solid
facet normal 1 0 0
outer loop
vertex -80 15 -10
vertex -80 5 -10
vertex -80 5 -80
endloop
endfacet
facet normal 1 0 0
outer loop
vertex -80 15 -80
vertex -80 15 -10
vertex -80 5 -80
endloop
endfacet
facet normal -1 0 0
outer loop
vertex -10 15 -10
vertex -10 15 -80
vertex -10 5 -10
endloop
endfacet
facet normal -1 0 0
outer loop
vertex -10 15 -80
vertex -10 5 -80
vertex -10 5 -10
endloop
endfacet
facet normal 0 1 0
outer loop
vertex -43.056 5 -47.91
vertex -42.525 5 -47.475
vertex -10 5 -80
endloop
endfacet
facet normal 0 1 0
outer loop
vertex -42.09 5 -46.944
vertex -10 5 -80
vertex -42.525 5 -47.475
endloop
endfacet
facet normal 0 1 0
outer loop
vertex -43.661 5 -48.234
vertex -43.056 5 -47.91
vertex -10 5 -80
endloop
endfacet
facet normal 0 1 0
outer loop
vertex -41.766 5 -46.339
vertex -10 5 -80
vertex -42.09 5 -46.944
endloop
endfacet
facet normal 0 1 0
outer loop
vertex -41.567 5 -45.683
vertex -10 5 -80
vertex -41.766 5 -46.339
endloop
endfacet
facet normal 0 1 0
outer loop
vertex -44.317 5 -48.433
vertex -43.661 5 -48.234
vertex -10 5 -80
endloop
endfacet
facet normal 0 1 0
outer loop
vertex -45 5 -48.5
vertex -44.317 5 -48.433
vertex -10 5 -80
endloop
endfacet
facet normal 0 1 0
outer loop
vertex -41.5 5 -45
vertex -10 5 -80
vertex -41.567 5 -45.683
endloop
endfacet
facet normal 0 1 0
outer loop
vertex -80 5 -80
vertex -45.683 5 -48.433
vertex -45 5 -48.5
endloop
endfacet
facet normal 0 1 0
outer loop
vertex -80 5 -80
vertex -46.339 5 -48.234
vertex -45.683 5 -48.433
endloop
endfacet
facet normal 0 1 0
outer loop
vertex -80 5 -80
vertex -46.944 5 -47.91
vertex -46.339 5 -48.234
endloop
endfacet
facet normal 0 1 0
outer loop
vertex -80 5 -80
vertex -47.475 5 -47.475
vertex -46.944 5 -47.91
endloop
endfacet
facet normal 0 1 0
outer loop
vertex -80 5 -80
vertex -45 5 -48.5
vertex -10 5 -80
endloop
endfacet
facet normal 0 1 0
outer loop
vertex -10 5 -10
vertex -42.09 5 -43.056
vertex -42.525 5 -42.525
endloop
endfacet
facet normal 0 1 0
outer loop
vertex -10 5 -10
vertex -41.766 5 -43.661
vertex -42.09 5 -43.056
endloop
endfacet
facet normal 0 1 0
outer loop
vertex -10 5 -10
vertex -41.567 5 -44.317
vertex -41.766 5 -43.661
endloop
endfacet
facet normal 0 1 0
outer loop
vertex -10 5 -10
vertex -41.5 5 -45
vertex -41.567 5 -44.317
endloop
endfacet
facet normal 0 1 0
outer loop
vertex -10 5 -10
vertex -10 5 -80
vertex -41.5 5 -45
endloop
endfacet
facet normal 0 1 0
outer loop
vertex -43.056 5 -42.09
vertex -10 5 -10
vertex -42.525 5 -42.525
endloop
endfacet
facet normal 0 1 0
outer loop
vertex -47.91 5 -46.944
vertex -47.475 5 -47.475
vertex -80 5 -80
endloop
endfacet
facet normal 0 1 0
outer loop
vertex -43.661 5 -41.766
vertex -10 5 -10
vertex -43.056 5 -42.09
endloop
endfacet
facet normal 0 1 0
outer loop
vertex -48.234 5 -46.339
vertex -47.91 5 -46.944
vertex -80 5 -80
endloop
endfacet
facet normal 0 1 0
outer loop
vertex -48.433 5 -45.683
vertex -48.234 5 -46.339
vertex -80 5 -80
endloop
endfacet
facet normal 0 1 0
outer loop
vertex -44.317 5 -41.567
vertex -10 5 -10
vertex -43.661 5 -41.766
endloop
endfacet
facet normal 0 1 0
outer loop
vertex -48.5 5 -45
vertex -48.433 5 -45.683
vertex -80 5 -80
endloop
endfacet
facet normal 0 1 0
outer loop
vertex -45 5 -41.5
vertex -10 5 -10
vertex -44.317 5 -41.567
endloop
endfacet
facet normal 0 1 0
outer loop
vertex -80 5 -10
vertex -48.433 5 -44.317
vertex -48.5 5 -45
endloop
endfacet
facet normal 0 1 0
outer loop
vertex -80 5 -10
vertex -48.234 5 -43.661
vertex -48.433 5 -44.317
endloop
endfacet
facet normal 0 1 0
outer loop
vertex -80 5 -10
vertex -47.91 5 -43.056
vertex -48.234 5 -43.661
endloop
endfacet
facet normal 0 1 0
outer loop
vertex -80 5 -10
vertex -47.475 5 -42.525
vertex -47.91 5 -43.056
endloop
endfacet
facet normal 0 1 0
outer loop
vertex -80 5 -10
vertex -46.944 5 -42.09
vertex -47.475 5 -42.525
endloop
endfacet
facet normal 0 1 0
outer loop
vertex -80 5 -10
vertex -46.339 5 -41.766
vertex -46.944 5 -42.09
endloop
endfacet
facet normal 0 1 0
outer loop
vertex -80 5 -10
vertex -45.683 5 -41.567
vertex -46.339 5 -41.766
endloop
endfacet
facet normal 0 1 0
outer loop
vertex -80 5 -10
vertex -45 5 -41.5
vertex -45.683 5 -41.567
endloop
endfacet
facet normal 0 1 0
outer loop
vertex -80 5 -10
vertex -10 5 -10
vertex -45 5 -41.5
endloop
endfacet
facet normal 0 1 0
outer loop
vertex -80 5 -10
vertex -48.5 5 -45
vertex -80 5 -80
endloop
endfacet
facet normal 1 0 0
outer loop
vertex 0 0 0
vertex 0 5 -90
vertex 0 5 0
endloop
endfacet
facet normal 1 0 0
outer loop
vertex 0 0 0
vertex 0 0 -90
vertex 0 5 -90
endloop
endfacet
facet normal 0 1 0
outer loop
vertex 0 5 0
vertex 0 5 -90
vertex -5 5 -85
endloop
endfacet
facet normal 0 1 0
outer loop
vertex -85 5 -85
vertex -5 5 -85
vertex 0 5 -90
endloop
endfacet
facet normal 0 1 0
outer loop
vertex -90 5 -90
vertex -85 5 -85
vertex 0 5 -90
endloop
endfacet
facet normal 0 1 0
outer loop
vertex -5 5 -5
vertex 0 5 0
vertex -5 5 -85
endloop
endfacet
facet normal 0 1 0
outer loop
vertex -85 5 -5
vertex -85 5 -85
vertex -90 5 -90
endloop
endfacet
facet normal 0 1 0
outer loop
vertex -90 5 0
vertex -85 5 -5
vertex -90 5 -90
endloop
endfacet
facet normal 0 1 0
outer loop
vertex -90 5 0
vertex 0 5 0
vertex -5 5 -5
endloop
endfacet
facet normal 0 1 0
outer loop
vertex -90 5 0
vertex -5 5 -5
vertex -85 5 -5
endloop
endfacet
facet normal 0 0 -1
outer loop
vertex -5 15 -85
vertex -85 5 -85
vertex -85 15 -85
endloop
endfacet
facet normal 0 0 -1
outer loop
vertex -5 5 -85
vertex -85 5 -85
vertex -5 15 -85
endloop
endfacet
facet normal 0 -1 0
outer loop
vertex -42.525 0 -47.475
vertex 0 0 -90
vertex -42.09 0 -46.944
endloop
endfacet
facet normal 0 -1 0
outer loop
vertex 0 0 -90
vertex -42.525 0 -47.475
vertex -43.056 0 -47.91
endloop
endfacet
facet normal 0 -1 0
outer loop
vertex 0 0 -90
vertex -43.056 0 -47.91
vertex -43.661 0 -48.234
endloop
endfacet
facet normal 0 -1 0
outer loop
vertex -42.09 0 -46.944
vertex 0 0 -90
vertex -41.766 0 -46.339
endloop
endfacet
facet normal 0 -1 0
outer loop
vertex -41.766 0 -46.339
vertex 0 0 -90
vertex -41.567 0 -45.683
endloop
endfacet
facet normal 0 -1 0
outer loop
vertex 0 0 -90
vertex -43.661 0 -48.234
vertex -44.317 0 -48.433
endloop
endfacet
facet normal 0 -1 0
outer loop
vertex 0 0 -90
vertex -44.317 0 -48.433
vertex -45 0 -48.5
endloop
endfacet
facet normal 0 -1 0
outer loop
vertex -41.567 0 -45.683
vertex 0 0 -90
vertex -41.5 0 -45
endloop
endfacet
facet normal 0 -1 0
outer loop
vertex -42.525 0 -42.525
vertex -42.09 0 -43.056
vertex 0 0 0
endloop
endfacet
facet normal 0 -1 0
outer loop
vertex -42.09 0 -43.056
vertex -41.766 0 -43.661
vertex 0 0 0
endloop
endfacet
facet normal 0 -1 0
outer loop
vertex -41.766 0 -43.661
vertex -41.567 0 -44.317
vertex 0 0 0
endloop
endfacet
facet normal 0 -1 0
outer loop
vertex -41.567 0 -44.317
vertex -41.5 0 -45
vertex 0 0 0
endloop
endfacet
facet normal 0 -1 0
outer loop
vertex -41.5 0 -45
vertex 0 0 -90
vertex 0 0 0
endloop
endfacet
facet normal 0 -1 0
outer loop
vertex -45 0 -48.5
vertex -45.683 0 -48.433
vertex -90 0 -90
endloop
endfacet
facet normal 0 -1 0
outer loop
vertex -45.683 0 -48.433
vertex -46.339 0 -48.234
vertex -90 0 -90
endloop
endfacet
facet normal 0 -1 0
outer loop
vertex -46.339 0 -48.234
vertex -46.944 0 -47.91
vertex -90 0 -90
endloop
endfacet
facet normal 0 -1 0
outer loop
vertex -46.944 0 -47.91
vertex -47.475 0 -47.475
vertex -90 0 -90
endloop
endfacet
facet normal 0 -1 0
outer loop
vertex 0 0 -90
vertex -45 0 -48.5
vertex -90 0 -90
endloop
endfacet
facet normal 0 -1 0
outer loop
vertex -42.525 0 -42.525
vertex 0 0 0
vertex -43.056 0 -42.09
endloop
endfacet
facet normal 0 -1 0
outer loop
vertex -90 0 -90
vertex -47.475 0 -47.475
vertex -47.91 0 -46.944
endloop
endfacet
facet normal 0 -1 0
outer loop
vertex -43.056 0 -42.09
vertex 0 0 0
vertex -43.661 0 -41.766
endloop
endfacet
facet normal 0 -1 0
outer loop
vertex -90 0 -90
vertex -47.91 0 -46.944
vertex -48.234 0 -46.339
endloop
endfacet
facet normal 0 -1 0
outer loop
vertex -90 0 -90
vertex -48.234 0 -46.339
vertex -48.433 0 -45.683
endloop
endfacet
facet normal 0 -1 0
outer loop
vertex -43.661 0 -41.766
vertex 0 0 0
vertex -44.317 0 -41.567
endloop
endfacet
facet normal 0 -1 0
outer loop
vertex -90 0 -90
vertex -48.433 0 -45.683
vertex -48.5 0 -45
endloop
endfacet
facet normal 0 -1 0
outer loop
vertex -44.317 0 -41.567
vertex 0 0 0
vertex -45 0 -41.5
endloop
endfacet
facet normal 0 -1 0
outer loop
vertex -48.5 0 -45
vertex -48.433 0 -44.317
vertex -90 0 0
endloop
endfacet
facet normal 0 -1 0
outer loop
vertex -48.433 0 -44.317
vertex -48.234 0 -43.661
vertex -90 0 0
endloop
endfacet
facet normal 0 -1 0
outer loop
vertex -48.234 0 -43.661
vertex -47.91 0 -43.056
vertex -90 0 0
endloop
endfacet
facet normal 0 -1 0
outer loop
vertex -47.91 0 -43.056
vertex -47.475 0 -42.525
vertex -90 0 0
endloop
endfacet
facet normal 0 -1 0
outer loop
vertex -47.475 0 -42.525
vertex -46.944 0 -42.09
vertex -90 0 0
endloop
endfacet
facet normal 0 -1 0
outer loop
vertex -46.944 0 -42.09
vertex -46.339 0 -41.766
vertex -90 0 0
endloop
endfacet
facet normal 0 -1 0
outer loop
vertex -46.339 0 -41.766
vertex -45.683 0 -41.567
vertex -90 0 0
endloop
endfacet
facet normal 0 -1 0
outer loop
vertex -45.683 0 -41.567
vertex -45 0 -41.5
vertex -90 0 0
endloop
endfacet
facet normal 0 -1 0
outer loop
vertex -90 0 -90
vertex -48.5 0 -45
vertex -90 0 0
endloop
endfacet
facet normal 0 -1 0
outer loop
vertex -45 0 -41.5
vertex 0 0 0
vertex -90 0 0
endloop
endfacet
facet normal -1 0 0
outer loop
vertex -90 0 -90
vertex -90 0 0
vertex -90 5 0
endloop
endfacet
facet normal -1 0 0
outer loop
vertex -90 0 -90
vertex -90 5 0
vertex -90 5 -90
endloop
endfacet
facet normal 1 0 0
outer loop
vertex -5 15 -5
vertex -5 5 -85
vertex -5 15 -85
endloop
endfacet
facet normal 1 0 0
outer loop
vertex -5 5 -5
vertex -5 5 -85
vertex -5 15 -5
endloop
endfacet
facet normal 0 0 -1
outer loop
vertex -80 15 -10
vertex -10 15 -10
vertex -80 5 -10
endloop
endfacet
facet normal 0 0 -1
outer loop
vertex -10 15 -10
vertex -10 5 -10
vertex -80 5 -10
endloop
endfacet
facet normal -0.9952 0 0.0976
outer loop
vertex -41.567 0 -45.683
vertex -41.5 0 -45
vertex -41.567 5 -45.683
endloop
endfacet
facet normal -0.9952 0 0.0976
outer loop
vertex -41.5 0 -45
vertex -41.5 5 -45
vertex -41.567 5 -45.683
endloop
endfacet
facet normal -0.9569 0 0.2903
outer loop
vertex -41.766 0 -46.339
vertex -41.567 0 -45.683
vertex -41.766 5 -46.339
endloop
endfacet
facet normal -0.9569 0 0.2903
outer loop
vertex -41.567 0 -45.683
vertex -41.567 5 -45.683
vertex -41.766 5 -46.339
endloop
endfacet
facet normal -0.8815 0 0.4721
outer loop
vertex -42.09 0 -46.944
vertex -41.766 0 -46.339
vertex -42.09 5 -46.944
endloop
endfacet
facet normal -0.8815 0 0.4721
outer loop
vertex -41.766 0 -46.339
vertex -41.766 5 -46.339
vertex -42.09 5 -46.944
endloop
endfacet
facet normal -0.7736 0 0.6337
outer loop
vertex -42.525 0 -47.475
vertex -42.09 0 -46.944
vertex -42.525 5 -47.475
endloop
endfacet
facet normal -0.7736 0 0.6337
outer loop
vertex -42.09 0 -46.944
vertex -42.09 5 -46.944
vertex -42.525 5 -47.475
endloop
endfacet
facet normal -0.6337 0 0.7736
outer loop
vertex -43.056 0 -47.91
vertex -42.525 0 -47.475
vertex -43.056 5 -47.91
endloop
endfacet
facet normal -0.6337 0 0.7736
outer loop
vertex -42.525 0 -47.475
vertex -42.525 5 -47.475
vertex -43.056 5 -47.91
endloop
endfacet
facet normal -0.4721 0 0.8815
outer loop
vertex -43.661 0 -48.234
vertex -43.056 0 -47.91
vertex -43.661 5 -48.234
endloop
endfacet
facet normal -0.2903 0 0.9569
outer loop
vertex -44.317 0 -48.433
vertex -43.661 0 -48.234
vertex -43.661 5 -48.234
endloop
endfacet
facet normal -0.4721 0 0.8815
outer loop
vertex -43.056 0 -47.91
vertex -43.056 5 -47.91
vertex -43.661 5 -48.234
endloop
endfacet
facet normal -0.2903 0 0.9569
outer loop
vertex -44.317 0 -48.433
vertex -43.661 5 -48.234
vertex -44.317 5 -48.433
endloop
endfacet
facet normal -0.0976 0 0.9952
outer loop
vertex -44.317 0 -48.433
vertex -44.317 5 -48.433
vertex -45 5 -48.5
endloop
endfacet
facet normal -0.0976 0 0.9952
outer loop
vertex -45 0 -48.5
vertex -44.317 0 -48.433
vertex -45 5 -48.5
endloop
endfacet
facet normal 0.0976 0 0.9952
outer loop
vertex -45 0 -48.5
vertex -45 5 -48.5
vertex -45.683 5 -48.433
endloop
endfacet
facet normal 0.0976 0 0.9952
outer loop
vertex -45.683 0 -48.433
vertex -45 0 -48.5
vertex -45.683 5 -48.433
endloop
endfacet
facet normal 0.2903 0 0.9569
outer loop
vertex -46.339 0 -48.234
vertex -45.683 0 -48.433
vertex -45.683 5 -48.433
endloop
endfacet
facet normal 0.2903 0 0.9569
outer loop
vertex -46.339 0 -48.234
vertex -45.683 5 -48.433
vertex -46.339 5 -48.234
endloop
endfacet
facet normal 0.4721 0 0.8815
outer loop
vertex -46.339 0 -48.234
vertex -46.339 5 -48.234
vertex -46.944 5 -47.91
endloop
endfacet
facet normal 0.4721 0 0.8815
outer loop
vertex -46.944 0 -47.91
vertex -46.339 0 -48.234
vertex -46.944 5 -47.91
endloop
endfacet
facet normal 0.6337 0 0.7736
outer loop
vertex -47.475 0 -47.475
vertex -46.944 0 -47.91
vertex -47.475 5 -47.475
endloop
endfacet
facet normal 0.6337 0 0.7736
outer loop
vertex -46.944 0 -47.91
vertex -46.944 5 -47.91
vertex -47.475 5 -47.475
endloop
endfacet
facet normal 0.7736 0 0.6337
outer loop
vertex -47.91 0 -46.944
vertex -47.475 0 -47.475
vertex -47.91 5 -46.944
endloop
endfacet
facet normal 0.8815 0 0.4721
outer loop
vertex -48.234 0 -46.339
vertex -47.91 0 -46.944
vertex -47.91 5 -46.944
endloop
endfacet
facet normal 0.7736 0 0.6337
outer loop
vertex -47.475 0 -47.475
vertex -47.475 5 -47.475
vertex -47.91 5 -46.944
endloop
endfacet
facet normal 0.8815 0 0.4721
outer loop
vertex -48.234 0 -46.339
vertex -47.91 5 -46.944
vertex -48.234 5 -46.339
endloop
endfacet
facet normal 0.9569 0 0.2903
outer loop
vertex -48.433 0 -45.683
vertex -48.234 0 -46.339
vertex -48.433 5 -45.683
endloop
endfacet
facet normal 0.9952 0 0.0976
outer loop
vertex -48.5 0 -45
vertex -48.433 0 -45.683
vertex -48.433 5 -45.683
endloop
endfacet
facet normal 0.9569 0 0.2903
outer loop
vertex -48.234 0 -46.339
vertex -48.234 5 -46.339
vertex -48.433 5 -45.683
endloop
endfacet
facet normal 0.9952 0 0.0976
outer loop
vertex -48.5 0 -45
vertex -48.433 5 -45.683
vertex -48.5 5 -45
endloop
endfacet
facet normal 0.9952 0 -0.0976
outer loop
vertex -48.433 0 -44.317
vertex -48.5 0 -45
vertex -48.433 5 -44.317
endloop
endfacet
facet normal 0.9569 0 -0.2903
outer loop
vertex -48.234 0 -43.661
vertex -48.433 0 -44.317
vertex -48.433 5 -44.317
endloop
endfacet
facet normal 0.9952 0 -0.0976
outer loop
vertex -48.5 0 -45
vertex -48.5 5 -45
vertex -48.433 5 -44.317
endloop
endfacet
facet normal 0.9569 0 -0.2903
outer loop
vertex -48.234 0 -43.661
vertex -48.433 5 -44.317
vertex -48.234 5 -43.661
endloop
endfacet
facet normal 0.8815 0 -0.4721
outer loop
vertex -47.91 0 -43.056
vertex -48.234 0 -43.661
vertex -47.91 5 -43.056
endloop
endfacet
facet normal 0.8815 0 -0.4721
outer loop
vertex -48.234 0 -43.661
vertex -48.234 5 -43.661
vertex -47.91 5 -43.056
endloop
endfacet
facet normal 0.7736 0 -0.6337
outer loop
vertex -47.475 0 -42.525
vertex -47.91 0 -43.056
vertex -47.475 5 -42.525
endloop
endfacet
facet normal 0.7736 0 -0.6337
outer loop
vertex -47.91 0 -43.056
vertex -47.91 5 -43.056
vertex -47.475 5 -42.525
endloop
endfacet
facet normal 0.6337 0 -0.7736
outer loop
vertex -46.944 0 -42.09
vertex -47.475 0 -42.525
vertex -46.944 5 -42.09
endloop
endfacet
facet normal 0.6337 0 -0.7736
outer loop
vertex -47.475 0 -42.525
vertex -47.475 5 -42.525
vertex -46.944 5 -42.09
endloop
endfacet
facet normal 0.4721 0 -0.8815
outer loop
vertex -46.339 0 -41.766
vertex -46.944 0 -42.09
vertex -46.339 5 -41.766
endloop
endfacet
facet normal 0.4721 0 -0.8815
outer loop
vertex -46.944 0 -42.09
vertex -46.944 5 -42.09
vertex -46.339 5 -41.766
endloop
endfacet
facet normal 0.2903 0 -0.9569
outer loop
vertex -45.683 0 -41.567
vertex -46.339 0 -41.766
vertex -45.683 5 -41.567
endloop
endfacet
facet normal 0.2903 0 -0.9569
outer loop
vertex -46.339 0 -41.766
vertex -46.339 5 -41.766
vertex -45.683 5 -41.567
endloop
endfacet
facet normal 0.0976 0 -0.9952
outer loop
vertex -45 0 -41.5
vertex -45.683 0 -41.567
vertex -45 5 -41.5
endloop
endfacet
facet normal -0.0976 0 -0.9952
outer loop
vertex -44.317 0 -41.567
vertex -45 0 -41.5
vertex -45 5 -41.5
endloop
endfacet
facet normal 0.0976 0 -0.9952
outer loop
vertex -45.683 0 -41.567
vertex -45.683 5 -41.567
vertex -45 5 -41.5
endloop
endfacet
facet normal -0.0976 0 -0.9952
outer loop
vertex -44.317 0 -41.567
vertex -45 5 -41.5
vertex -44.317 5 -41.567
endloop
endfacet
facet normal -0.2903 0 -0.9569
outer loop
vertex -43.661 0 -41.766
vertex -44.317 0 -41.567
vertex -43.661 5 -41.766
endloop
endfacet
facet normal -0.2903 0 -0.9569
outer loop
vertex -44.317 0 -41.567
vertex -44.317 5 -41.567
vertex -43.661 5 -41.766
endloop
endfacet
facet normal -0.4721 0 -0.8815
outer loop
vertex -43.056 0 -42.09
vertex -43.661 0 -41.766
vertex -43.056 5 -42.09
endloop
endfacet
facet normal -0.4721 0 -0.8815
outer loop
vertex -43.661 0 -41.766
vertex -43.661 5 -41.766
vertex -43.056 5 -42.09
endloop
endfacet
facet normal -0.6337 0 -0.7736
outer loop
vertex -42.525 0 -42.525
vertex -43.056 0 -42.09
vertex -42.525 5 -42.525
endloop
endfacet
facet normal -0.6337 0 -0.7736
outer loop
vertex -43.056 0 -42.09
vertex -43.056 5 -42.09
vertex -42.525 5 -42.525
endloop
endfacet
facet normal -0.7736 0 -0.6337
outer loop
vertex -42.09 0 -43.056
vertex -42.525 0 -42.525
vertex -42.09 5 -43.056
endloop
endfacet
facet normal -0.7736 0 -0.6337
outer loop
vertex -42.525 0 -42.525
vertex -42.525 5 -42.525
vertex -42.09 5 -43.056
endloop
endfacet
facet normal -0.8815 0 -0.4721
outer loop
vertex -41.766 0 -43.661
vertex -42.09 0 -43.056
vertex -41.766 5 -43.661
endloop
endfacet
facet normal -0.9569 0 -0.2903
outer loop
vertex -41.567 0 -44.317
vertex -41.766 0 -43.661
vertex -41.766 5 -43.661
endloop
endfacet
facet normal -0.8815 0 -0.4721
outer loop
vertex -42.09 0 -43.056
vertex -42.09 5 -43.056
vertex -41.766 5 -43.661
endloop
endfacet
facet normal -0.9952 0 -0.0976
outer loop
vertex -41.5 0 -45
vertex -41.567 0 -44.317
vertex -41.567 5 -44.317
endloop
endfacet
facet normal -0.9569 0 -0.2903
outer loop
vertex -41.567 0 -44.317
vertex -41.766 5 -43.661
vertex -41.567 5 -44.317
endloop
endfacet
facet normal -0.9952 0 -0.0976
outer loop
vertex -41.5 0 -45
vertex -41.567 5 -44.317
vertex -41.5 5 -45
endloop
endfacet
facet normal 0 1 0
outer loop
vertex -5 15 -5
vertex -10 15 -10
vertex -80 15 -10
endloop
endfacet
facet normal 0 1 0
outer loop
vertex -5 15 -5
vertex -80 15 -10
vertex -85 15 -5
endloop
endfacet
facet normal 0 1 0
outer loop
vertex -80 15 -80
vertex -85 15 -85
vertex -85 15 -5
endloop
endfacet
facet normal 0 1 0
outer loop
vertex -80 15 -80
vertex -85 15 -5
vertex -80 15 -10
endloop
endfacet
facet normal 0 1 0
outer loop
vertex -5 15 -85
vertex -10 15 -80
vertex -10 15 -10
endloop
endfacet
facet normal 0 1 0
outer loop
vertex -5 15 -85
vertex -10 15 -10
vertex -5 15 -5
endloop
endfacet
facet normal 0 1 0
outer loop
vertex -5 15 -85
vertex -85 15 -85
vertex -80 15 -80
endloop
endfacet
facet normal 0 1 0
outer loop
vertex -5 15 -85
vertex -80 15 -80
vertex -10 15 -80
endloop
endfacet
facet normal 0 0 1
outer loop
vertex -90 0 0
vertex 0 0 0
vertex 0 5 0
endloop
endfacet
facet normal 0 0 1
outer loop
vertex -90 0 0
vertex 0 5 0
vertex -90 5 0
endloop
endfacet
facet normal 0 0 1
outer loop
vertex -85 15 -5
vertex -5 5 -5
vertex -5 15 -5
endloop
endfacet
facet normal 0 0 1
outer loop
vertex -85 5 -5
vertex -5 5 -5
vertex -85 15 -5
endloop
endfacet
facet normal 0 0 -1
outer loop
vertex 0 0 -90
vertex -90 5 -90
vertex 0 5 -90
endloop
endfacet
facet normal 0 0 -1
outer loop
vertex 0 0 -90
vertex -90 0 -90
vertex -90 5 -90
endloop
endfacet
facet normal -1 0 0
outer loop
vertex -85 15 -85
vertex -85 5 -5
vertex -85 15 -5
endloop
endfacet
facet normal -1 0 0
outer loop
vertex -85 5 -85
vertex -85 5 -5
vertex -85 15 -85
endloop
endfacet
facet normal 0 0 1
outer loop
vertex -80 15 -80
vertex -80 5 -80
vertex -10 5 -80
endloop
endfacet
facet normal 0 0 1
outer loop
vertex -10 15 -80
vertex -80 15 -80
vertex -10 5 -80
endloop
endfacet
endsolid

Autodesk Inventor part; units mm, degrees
ref_plane "YZ Plane" through (0, 0, 0) normal (1, 0, 0) x (0, 1, 0)
ref_plane "XZ Plane" through (0, 0, 0) normal (0, 1, 0) x (-1, 0, 0)
ref_plane "XY Plane" through (0, 0, 0) normal (0, 0, 1) x (1, 0, 0)
sketch "Sketch1" plane through (0, 0, 0) normal (0, 1, 0) x (-1, 0, 0)
  line L0 (0, 0) -> (90, 0)
  line L1 (90, 0) -> (90, -90)
  line L2 (90, -90) -> (0, -90)
  line L3 (0, -90) -> (0, 0)
  dimension "d0" = 90
  dimension "d1" = 90
extrude "Extrusion1" add sketch "Sketch1" along normal blind 5
sketch "Sketch2" plane through (0, 5, 0) normal (0, 1, 0) x (1, 0, 0)
  line L0 (-5, 5) -> (-85, 5)
  line L1 (-85, 5) -> (-85, 85)
  line L2 (-85, 85) -> (-5, 85)
  line L3 (-5, 85) -> (-5, 5)
  line L4 (0, 0) -> (0, 90) projected
  line L5 (-90, 0) -> (0, 0) projected
  line L6 (-10, 10) -> (-80, 10)
  line L7 (-80, 10) -> (-80, 80)
  line L8 (-80, 80) -> (-10, 80)
  line L9 (-10, 80) -> (-10, 10)
  dimension "d4" = 5
  dimension "d5" = 5
  dimension "d6" = 80
  dimension "d7" = 80
  dimension "d8" = 5
  dimension "d9" = 5
  dimension "d10" = 70
  dimension "d11" = 70
extrude "Extrusion2" add sketch "Sketch2" along normal blind 10
sketch "Sketch3" plane through (0, 5, 0) normal (0, 1, 0) x (1, 0, 0)
  circle A0 centre (-45, 45) radius 3.5
  line L0 (0, 0) -> (0, 90) projected
  line L1 (0, 90) -> (-90, 90) projected
  dimension "d14" = 45
  dimension "d15" = 45
  dimension "d16" = 7
extrude "Extrusion3" cut sketch "Sketch3" against normal blind 10
properties part number "BlackBoxTopFall2019"
